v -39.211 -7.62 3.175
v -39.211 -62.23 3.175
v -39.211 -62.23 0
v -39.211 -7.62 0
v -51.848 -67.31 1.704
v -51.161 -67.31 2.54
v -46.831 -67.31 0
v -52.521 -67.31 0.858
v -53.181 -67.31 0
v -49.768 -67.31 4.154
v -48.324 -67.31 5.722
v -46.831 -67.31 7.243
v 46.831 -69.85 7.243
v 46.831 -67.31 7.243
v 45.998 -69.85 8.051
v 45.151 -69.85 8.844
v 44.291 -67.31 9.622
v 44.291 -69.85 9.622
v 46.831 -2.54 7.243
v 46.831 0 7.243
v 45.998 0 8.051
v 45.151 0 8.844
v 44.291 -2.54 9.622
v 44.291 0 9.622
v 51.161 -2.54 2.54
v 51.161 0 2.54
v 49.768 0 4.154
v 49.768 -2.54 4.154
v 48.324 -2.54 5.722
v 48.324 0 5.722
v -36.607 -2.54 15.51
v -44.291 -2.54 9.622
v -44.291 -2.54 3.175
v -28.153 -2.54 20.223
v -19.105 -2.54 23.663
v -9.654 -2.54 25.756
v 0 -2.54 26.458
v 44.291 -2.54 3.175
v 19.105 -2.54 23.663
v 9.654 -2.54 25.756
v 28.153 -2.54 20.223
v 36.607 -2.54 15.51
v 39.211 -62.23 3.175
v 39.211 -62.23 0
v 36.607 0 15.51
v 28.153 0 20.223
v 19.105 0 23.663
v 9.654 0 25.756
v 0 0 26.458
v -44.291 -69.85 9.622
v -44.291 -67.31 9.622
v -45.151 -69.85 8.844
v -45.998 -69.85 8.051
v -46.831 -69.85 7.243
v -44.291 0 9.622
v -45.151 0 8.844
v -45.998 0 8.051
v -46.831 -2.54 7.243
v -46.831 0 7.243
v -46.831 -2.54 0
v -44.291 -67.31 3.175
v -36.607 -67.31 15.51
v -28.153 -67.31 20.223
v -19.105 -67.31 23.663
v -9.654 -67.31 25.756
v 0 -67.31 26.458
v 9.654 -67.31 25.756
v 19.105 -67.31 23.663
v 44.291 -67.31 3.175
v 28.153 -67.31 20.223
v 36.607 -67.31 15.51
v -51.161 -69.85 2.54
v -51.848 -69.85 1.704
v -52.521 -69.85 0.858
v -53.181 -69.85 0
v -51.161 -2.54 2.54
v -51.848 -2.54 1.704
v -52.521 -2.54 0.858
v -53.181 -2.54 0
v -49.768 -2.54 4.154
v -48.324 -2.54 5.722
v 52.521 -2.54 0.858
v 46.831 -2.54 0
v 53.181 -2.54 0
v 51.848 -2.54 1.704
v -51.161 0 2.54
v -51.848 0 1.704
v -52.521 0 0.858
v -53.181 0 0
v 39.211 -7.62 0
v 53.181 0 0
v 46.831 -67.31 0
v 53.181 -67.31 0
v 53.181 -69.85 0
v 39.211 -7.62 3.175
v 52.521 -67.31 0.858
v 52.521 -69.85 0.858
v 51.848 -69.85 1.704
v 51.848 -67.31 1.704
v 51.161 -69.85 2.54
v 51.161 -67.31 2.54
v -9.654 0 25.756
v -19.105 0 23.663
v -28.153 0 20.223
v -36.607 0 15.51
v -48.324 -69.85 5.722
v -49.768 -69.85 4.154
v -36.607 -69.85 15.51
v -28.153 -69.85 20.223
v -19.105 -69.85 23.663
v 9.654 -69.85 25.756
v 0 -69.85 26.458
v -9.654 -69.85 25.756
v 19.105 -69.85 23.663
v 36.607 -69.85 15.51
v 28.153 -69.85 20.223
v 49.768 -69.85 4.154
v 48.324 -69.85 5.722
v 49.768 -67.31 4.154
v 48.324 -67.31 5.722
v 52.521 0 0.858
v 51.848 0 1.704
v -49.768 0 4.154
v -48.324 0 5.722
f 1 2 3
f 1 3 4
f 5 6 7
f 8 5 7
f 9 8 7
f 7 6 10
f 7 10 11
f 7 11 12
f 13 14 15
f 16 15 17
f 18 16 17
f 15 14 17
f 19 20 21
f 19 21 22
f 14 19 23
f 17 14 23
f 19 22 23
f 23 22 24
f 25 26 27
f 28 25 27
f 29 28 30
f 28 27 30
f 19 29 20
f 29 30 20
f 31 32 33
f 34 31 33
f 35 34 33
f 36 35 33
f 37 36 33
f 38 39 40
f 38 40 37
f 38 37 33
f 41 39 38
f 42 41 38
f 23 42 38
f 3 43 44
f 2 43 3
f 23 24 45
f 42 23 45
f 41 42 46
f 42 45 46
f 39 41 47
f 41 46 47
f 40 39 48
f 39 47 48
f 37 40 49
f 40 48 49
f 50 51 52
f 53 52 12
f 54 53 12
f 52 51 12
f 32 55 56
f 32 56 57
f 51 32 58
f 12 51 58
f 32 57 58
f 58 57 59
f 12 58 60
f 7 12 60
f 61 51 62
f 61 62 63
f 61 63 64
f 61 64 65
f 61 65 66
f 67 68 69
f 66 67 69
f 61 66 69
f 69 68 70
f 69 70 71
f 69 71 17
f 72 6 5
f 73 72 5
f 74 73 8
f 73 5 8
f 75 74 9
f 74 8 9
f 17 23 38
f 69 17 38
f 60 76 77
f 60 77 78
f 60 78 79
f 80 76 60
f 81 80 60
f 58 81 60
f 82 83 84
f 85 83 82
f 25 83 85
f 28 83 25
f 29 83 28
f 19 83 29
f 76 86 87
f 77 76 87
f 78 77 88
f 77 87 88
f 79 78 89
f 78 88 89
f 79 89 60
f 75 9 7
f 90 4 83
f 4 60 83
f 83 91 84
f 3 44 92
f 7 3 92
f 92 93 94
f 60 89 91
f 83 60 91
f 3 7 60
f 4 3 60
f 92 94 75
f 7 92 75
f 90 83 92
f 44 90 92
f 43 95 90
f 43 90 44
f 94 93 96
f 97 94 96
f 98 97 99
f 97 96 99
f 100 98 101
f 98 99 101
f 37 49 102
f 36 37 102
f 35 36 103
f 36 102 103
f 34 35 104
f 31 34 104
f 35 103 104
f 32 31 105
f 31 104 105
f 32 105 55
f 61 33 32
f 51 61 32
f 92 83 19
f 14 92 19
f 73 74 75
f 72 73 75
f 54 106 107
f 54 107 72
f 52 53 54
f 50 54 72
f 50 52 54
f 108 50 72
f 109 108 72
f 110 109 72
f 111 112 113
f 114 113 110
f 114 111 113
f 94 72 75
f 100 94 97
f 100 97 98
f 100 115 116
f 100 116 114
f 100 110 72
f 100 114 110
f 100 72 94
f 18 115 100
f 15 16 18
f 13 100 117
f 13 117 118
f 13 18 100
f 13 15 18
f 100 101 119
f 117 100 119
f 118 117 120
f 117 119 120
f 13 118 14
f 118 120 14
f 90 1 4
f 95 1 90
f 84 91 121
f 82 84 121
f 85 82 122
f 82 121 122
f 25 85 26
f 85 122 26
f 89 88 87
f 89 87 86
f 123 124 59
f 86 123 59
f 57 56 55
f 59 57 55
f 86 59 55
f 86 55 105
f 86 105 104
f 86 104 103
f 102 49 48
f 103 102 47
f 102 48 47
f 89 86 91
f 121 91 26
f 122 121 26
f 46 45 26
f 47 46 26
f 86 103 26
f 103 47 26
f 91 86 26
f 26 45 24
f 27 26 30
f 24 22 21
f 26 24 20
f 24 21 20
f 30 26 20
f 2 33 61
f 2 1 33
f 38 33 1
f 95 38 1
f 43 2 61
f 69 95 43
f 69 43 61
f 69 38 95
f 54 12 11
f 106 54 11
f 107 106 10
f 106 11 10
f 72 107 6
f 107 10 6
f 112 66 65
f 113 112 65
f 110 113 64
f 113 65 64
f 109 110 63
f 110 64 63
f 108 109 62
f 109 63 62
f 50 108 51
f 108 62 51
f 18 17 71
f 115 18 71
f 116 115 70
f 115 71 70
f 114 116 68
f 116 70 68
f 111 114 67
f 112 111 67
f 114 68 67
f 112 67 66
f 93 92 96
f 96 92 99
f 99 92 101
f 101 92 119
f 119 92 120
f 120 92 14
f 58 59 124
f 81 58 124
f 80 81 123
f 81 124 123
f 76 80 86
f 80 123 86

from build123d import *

# Parameters (mm, degrees)
F0_W      = 88.5811836569
F0_H      = 6.35
F1_DEPTH  = 2.54
F2_START  = 67.31
F2_DEPTH  = 2.54
F3_DEPTH  = 69.85
F4_W      = 90.1380174519
F4_H      = 3.175
F5_DEPTH  = 5.08
F6_W      = 90.1380174519
F6_H      = 3.175
F7_DEPTH  = 5.08
F8_W      = 54.61
F8_H      = 3.175
F9_DEPTH  = 5.08
F10_W     = 54.61
F10_H     = 3.175
F11_DEPTH = 5.08


with BuildPart() as f1:
    # F0 (on Front) → F1 (new body)
    with BuildSketch(Plane.XZ):
        with BuildLine():
            Line((-53.1805918284, 0), (-46.8305918284, 0))
            Line((-46.8305918284, 0), (-46.8305918284, 2.54))
            Line((-46.8305918284, 2.54), (-51.160757232, 2.54))
            ThreePointArc((-51.160757232, 2.54), (-52.1861301587, 1.2822904776), (-53.1805918284, 0))
        make_face()
        with BuildLine():
            Line((46.8305918284, 2.54), (46.8305918284, 0))
            Line((46.8305918284, 0), (53.1805918284, 0))
            ThreePointArc((53.1805918284, 0), (52.1861301587, 1.2822904776), (51.160757232, 2.54))
            Line((51.160757232, 2.54), (46.8305918284, 2.54))
        make_face()
        with BuildLine():
            Line((-46.8305918284, 0), (-44.2905918284, 0))
            Line((-44.2905918284, 0), (-44.2905918284, 6.35))
            Line((-44.2905918284, 6.35), (-44.2905918284, 9.6220642611))
            ThreePointArc((-44.2905918284, 9.6220642611), (-45.5761135004, 8.4492711462), (-46.8305918284, 7.2433301096))
            Line((-46.8305918284, 7.2433301096), (-46.8305918284, 2.54))
            Line((-46.8305918284, 2.54), (-46.8305918284, 0))
        make_face()
        with BuildLine():
            Line((44.2905918284, 6.35), (44.2905918284, 0))
            Line((44.2905918284, 0), (46.8305918284, 0))
            Line((46.8305918284, 0), (46.8305918284, 2.54))
            Line((46.8305918284, 2.54), (46.8305918284, 7.2433301096))
            ThreePointArc((46.8305918284, 7.2433301096), (45.5761135004, 8.4492711462), (44.2905918284, 9.6220642611))
            Line((44.2905918284, 9.6220642611), (44.2905918284, 6.35))
        make_face()
        with Locations((0, 3.175)):
            Rectangle(F0_W, F0_H)
        with BuildLine():
            Line((-51.160757232, 2.54), (-46.8305918284, 2.54))
            Line((-46.8305918284, 2.54), (-46.8305918284, 7.2433301096))
            ThreePointArc((-46.8305918284, 7.2433301096), (-49.0520789692, 4.9435943357), (-51.160757232, 2.54))
        make_face()
        with BuildLine():
            Line((46.8305918284, 7.2433301096), (46.8305918284, 2.54))
            Line((46.8305918284, 2.54), (51.160757232, 2.54))
            ThreePointArc((51.160757232, 2.54), (49.0520789692, 4.9435943357), (46.8305918284, 7.2433301096))
        make_face()
        with BuildLine():
            Line((-44.2905918284, 6.35), (44.2905918284, 6.35))
            Line((44.2905918284, 6.35), (44.2905918284, 9.6220642611))
            ThreePointArc((44.2905918284, 9.6220642611), (23.6913300639, 22.1072974627), (0, 26.4583333333))
            ThreePointArc((0, 26.4583333333), (-23.6913300639, 22.1072974627), (-44.2905918284, 9.6220642611))
            Line((-44.2905918284, 9.6220642611), (-44.2905918284, 6.35))
        make_face()
    extrude(amount=F1_DEPTH)



with BuildPart() as f2:
    # F0 (on Front) → F2 (new body)
    with BuildSketch(Plane.XZ.offset(F2_START)):
        with BuildLine():
            Line((-53.1805918284, 0), (-46.8305918284, 0))
            Line((-46.8305918284, 0), (-46.8305918284, 2.54))
            Line((-46.8305918284, 2.54), (-51.160757232, 2.54))
            ThreePointArc((-51.160757232, 2.54), (-52.1861301587, 1.2822904776), (-53.1805918284, 0))
        make_face()
        with BuildLine():
            Line((-51.160757232, 2.54), (-46.8305918284, 2.54))
            Line((-46.8305918284, 2.54), (-46.8305918284, 7.2433301096))
            ThreePointArc((-46.8305918284, 7.2433301096), (-49.0520789692, 4.9435943357), (-51.160757232, 2.54))
        make_face()
        with BuildLine():
            Line((-46.8305918284, 0), (-44.2905918284, 0))
            Line((-44.2905918284, 0), (-44.2905918284, 6.35))
            Line((-44.2905918284, 6.35), (-44.2905918284, 9.6220642611))
            ThreePointArc((-44.2905918284, 9.6220642611), (-45.5761135004, 8.4492711462), (-46.8305918284, 7.2433301096))
            Line((-46.8305918284, 7.2433301096), (-46.8305918284, 2.54))
            Line((-46.8305918284, 2.54), (-46.8305918284, 0))
        make_face()
        with Locations((0, 3.175)):
            Rectangle(F0_W, F0_H)
        with BuildLine():
            Line((44.2905918284, 6.35), (44.2905918284, 0))
            Line((44.2905918284, 0), (46.8305918284, 0))
            Line((46.8305918284, 0), (46.8305918284, 2.54))
            Line((46.8305918284, 2.54), (46.8305918284, 7.2433301096))
            ThreePointArc((46.8305918284, 7.2433301096), (45.5761135004, 8.4492711462), (44.2905918284, 9.6220642611))
            Line((44.2905918284, 9.6220642611), (44.2905918284, 6.35))
        make_face()
        with BuildLine():
            Line((46.8305918284, 7.2433301096), (46.8305918284, 2.54))
            Line((46.8305918284, 2.54), (51.160757232, 2.54))
            ThreePointArc((51.160757232, 2.54), (49.0520789692, 4.9435943357), (46.8305918284, 7.2433301096))
        make_face()
        with BuildLine():
            Line((46.8305918284, 2.54), (46.8305918284, 0))
            Line((46.8305918284, 0), (53.1805918284, 0))
            ThreePointArc((53.1805918284, 0), (52.1861301587, 1.2822904776), (51.160757232, 2.54))
            Line((51.160757232, 2.54), (46.8305918284, 2.54))
        make_face()
        with BuildLine():
            Line((-44.2905918284, 6.35), (44.2905918284, 6.35))
            Line((44.2905918284, 6.35), (44.2905918284, 9.6220642611))
            ThreePointArc((44.2905918284, 9.6220642611), (23.6913300639, 22.1072974627), (0, 26.4583333333))
            ThreePointArc((0, 26.4583333333), (-23.6913300639, 22.1072974627), (-44.2905918284, 9.6220642611))
            Line((-44.2905918284, 9.6220642611), (-44.2905918284, 6.35))
        make_face()
    extrude(amount=F2_DEPTH)


with BuildPart() as f1_1:
    add(f1.part)

    add(f2.part)  # F3 merges F2
    # F0 (on Front) → F3 (join)
    with BuildSketch(Plane.XZ):
        with BuildLine():
            Line((-46.8305918284, 0), (-44.2905918284, 0))
            Line((-44.2905918284, 0), (-44.2905918284, 6.35))
            Line((-44.2905918284, 6.35), (-44.2905918284, 9.6220642611))
            ThreePointArc((-44.2905918284, 9.6220642611), (-45.5761135004, 8.4492711462), (-46.8305918284, 7.2433301096))
            Line((-46.8305918284, 7.2433301096), (-46.8305918284, 2.54))
            Line((-46.8305918284, 2.54), (-46.8305918284, 0))
        make_face()
        with BuildLine():
            Line((44.2905918284, 6.35), (44.2905918284, 0))
            Line((44.2905918284, 0), (46.8305918284, 0))
            Line((46.8305918284, 0), (46.8305918284, 2.54))
            Line((46.8305918284, 2.54), (46.8305918284, 7.2433301096))
            ThreePointArc((46.8305918284, 7.2433301096), (45.5761135004, 8.4492711462), (44.2905918284, 9.6220642611))
            Line((44.2905918284, 9.6220642611), (44.2905918284, 6.35))
        make_face()
    extrude(amount=F3_DEPTH)

    # F4 (on face) → F5 (join)
    with BuildSketch(Plane.XZ.offset(2.54)):
        with Locations((0.7784168975, 1.5875)):
            Rectangle(F4_W, F4_H)
    extrude(amount=F5_DEPTH)

    # F6 (on face) → F7 (join)
    with BuildSketch(Plane(origin=(0, -67.31, 0), x_dir=(-1, 0, 0), z_dir=(0, 1, 0))):
        with Locations((0.7784168975, 1.5875)):
            Rectangle(F6_W, F6_H)
    extrude(amount=F7_DEPTH)

    # F8 (on face) → F9 (join)
    with BuildSketch(Plane.YZ.offset(-44.2905918284)):
        with Locations((-34.925, 1.5875)):
            Rectangle(F8_W, F8_H)
    extrude(amount=F9_DEPTH)

    # F10 (on face) → F11 (join)
    with BuildSketch(Plane(origin=(44.2905918284, 0, 0), x_dir=(0, -1, 0), z_dir=(-1, 0, 0))):
        with Locations((34.925, 1.5875)):
            Rectangle(F10_W, F10_H)
    extrude(amount=F11_DEPTH)


solid = f1_1.part
